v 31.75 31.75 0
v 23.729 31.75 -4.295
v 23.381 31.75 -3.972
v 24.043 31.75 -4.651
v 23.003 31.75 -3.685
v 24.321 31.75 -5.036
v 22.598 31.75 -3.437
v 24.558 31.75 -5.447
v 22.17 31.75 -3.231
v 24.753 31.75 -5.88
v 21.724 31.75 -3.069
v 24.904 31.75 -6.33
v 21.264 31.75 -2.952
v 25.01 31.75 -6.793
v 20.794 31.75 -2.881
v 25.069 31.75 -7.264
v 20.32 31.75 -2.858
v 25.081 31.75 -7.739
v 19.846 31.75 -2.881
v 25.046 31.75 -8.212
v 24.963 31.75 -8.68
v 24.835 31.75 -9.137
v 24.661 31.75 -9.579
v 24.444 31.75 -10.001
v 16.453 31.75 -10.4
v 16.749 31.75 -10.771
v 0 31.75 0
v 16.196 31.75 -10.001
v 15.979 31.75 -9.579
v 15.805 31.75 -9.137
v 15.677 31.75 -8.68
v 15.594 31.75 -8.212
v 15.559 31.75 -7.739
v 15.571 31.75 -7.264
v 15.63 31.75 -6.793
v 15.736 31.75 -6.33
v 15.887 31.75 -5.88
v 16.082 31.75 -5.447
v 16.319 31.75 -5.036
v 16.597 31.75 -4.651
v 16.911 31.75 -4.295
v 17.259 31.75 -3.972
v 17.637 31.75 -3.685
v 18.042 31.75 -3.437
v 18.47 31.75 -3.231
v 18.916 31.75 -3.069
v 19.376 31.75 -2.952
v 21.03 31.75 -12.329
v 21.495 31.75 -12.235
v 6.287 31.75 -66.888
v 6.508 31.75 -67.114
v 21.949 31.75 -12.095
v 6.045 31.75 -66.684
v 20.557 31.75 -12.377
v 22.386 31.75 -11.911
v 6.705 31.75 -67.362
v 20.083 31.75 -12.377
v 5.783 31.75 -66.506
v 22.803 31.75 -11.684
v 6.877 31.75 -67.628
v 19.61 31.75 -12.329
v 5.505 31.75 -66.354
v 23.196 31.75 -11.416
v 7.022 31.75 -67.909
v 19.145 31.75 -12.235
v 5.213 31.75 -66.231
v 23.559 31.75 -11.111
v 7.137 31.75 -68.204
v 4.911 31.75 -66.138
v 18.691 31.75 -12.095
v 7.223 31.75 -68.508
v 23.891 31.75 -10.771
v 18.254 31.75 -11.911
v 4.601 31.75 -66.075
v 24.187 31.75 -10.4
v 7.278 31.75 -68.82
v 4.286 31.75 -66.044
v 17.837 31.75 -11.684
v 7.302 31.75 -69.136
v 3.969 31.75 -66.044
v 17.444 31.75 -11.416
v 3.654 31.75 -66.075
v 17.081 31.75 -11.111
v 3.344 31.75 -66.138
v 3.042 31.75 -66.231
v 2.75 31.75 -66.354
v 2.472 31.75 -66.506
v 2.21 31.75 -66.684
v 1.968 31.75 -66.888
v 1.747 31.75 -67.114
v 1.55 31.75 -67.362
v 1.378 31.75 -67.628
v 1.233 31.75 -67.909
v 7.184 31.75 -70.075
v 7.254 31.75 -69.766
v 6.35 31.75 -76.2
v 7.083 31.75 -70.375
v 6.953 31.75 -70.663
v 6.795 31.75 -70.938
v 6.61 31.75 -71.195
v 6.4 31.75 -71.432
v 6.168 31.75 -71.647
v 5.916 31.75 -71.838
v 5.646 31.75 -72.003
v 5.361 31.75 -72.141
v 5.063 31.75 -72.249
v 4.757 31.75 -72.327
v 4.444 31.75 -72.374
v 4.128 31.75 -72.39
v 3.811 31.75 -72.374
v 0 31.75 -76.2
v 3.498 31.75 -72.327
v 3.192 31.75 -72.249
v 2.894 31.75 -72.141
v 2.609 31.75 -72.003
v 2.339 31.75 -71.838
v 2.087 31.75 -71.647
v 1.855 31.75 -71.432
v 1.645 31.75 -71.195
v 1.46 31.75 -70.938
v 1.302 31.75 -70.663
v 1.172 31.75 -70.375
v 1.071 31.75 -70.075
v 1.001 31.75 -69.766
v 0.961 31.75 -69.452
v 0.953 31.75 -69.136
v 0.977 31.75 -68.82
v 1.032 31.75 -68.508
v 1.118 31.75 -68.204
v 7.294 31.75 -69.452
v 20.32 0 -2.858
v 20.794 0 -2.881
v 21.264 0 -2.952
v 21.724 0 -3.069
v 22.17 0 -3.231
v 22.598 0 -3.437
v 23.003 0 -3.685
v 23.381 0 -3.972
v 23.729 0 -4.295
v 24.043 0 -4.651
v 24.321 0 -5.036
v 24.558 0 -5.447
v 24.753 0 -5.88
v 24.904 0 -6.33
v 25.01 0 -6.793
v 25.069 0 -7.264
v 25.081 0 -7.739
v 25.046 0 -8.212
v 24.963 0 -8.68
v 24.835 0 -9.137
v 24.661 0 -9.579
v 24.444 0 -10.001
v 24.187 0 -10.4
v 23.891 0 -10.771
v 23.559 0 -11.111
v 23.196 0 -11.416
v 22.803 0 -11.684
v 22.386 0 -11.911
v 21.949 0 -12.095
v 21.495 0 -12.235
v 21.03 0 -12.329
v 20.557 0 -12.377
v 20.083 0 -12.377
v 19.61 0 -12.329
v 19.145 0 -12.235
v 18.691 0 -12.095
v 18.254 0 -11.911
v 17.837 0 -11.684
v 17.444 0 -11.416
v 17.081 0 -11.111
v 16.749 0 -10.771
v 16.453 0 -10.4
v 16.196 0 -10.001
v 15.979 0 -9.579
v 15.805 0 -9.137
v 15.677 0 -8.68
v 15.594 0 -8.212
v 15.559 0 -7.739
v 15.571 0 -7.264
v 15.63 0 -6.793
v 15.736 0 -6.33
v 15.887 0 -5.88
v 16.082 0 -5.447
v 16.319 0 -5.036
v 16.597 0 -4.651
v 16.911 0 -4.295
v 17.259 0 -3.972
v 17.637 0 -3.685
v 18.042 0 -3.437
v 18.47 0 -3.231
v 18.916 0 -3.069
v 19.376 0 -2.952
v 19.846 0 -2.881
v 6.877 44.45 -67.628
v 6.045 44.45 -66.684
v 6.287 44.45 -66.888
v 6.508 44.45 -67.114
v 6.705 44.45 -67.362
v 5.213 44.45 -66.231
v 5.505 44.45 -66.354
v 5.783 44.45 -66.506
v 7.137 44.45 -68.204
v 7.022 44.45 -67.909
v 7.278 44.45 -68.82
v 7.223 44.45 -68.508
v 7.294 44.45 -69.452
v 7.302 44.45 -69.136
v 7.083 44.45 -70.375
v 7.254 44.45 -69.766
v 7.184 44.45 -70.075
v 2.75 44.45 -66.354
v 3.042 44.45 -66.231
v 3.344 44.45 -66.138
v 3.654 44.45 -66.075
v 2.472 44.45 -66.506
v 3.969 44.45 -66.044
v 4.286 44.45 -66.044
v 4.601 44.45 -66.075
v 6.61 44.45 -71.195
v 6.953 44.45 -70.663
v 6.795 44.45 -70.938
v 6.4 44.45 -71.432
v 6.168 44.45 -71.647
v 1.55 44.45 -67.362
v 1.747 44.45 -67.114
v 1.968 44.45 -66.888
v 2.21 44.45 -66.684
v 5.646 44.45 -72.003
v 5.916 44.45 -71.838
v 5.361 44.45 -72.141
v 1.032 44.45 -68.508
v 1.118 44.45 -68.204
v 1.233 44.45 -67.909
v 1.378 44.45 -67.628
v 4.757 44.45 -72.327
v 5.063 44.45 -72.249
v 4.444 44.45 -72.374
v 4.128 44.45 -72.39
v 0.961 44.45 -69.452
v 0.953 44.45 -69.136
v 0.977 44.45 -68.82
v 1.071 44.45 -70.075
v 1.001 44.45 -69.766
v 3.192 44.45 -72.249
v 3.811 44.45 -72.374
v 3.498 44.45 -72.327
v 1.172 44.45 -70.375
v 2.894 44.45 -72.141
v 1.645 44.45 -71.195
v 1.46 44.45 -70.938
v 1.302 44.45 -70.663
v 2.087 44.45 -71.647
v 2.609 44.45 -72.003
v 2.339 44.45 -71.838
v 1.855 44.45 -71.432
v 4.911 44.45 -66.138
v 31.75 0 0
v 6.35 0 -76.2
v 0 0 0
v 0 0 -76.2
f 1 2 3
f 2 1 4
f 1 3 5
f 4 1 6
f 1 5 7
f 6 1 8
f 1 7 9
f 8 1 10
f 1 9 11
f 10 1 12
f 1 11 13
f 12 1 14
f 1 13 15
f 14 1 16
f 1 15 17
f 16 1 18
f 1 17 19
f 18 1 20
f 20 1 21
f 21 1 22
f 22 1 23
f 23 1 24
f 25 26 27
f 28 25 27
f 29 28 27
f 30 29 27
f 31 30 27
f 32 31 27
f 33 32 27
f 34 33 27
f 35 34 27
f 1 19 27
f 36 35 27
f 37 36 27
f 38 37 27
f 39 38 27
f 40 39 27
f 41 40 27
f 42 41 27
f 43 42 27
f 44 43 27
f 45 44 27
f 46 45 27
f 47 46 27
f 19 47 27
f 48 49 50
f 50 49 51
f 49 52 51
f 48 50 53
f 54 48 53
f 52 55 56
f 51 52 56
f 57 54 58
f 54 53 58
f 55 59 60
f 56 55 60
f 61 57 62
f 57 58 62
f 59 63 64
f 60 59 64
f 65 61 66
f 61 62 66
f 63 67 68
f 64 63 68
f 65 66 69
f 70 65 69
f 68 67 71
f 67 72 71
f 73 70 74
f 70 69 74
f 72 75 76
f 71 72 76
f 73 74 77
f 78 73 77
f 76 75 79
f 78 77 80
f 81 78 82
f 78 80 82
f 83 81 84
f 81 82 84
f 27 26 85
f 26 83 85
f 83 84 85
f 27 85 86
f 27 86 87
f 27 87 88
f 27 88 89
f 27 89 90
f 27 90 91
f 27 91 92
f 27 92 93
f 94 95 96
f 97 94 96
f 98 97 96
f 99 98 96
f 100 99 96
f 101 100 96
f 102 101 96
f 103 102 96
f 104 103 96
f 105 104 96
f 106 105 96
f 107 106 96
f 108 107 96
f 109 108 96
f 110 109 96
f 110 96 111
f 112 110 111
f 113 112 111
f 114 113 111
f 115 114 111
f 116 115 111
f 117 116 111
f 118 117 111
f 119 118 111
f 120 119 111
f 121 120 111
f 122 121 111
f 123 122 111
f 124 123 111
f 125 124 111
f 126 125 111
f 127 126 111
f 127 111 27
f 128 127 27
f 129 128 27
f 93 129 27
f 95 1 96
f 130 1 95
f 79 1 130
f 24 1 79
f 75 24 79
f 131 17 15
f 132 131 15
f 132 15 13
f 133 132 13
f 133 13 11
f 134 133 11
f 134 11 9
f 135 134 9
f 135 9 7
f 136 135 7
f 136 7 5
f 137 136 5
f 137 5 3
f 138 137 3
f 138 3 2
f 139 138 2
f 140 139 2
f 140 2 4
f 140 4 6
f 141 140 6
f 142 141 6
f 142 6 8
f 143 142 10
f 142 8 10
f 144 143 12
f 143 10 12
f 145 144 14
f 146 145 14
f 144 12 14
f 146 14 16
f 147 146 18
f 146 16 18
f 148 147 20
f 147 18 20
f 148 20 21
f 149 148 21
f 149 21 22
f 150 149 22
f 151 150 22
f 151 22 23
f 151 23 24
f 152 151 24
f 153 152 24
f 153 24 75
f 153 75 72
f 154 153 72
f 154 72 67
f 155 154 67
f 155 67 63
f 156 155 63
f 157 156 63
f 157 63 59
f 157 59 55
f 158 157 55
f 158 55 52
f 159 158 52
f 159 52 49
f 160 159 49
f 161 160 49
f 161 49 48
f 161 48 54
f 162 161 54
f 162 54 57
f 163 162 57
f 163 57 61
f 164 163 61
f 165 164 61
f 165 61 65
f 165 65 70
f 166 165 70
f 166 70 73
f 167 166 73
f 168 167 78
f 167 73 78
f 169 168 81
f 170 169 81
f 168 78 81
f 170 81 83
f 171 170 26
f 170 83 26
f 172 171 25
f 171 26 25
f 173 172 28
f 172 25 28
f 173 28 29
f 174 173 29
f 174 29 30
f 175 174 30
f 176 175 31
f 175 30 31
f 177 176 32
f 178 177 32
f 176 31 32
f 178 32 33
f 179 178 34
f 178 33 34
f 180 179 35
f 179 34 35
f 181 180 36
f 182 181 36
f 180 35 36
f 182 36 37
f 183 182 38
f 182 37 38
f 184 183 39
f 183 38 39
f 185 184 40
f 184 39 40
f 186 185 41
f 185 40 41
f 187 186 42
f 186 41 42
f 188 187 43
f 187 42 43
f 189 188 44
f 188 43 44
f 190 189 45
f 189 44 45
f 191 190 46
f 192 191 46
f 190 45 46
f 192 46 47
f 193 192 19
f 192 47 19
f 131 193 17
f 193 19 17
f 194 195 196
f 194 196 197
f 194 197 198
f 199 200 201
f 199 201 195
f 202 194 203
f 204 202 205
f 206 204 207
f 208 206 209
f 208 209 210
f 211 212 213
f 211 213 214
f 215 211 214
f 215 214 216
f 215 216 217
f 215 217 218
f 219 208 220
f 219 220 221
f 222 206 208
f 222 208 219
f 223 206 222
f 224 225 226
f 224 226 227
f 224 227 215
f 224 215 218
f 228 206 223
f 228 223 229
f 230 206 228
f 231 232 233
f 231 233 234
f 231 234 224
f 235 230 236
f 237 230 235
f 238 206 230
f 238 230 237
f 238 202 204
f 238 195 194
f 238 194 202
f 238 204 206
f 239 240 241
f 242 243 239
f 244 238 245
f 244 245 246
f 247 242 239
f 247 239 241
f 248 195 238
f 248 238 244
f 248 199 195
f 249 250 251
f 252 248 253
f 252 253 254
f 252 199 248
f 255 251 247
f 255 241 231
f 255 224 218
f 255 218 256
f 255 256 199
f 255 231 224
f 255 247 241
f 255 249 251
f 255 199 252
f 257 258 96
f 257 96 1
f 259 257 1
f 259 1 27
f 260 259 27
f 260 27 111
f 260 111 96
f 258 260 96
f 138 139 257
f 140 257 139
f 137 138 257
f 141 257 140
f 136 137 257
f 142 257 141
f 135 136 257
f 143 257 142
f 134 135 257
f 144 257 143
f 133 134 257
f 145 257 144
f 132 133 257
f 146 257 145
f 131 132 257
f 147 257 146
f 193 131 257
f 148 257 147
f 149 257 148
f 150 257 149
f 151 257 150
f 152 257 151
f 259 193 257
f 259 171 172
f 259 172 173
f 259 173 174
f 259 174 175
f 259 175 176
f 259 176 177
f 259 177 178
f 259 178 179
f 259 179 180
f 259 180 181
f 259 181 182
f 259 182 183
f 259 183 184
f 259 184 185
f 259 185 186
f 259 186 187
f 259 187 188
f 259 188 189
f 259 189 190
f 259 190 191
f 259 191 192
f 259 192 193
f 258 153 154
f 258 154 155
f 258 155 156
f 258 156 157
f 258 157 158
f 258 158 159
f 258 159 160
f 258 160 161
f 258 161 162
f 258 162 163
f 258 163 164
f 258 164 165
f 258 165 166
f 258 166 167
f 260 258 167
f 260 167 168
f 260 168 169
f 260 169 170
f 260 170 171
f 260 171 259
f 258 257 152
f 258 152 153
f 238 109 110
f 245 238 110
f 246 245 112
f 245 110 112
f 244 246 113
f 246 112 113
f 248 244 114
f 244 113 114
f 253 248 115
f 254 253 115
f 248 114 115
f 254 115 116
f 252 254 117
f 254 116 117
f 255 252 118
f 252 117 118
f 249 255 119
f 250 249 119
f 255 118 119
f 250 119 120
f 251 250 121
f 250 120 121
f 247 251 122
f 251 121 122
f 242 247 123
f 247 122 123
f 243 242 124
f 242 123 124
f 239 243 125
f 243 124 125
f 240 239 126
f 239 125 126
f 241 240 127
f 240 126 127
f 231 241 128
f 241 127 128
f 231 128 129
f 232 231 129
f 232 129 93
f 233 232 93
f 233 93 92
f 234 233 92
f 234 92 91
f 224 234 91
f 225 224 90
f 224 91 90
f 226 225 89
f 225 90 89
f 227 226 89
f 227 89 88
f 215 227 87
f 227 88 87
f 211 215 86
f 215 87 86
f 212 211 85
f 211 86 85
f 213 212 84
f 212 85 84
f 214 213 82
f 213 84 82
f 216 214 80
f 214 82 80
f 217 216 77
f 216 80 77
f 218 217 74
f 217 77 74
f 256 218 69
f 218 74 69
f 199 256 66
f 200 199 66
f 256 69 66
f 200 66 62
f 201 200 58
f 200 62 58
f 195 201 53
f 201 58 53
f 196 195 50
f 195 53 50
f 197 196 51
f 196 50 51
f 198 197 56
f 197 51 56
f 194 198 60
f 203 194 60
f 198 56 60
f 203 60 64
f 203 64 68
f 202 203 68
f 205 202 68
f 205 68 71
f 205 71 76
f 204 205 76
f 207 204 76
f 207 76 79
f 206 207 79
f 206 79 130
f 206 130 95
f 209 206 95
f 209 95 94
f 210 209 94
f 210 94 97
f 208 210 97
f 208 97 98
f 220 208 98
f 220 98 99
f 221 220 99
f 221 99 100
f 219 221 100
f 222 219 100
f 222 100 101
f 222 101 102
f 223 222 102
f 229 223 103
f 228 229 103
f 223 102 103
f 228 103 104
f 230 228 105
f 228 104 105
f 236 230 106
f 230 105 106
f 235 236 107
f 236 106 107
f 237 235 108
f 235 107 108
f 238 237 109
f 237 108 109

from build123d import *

# Parameters (mm, degrees)
BOSS_EXTRUDE1_DEPTH = 31.75
SKETCH2_R           = 4.7625
CUT_EXTRUDE2_DEPTH  = 89.44526556
SKETCH3_R           = 3.175
BOSS_EXTRUDE2_DEPTH = 12.7


with BuildPart() as part:
    # Sketch1 → Boss-Extrude1 (new body)
    with BuildSketch(Plane(origin=(0, 0, 0), x_dir=(1, 0, 0), z_dir=(0, 1, 0))):
        Polygon((0, 0), (0, 76.2), (6.35, 76.2), (31.75, 0), align=None)
    extrude(amount=BOSS_EXTRUDE1_DEPTH)

    # Sketch2 → Cut-Extrude2 (cut, through all)
    with BuildSketch(Plane(origin=(0, 31.75, 0), x_dir=(1, 0, 0), z_dir=(0, 1, 0))):
        with Locations(Location((20.32, 7.62, 0), (0, 0, 270))):
            Circle(SKETCH2_R)
    extrude(amount=-CUT_EXTRUDE2_DEPTH, mode=Mode.SUBTRACT)

    # Sketch3 → Boss-Extrude2 (add)
    with BuildSketch(Plane(origin=(0, 31.75, 0), x_dir=(1, 0, 0), z_dir=(0, 1, 0))):
        with Locations(Location((4.1275, 69.215, 0), (0, 0, 90))):
            Circle(SKETCH3_R)
    extrude(amount=BOSS_EXTRUDE2_DEPTH)


solid = part.part
